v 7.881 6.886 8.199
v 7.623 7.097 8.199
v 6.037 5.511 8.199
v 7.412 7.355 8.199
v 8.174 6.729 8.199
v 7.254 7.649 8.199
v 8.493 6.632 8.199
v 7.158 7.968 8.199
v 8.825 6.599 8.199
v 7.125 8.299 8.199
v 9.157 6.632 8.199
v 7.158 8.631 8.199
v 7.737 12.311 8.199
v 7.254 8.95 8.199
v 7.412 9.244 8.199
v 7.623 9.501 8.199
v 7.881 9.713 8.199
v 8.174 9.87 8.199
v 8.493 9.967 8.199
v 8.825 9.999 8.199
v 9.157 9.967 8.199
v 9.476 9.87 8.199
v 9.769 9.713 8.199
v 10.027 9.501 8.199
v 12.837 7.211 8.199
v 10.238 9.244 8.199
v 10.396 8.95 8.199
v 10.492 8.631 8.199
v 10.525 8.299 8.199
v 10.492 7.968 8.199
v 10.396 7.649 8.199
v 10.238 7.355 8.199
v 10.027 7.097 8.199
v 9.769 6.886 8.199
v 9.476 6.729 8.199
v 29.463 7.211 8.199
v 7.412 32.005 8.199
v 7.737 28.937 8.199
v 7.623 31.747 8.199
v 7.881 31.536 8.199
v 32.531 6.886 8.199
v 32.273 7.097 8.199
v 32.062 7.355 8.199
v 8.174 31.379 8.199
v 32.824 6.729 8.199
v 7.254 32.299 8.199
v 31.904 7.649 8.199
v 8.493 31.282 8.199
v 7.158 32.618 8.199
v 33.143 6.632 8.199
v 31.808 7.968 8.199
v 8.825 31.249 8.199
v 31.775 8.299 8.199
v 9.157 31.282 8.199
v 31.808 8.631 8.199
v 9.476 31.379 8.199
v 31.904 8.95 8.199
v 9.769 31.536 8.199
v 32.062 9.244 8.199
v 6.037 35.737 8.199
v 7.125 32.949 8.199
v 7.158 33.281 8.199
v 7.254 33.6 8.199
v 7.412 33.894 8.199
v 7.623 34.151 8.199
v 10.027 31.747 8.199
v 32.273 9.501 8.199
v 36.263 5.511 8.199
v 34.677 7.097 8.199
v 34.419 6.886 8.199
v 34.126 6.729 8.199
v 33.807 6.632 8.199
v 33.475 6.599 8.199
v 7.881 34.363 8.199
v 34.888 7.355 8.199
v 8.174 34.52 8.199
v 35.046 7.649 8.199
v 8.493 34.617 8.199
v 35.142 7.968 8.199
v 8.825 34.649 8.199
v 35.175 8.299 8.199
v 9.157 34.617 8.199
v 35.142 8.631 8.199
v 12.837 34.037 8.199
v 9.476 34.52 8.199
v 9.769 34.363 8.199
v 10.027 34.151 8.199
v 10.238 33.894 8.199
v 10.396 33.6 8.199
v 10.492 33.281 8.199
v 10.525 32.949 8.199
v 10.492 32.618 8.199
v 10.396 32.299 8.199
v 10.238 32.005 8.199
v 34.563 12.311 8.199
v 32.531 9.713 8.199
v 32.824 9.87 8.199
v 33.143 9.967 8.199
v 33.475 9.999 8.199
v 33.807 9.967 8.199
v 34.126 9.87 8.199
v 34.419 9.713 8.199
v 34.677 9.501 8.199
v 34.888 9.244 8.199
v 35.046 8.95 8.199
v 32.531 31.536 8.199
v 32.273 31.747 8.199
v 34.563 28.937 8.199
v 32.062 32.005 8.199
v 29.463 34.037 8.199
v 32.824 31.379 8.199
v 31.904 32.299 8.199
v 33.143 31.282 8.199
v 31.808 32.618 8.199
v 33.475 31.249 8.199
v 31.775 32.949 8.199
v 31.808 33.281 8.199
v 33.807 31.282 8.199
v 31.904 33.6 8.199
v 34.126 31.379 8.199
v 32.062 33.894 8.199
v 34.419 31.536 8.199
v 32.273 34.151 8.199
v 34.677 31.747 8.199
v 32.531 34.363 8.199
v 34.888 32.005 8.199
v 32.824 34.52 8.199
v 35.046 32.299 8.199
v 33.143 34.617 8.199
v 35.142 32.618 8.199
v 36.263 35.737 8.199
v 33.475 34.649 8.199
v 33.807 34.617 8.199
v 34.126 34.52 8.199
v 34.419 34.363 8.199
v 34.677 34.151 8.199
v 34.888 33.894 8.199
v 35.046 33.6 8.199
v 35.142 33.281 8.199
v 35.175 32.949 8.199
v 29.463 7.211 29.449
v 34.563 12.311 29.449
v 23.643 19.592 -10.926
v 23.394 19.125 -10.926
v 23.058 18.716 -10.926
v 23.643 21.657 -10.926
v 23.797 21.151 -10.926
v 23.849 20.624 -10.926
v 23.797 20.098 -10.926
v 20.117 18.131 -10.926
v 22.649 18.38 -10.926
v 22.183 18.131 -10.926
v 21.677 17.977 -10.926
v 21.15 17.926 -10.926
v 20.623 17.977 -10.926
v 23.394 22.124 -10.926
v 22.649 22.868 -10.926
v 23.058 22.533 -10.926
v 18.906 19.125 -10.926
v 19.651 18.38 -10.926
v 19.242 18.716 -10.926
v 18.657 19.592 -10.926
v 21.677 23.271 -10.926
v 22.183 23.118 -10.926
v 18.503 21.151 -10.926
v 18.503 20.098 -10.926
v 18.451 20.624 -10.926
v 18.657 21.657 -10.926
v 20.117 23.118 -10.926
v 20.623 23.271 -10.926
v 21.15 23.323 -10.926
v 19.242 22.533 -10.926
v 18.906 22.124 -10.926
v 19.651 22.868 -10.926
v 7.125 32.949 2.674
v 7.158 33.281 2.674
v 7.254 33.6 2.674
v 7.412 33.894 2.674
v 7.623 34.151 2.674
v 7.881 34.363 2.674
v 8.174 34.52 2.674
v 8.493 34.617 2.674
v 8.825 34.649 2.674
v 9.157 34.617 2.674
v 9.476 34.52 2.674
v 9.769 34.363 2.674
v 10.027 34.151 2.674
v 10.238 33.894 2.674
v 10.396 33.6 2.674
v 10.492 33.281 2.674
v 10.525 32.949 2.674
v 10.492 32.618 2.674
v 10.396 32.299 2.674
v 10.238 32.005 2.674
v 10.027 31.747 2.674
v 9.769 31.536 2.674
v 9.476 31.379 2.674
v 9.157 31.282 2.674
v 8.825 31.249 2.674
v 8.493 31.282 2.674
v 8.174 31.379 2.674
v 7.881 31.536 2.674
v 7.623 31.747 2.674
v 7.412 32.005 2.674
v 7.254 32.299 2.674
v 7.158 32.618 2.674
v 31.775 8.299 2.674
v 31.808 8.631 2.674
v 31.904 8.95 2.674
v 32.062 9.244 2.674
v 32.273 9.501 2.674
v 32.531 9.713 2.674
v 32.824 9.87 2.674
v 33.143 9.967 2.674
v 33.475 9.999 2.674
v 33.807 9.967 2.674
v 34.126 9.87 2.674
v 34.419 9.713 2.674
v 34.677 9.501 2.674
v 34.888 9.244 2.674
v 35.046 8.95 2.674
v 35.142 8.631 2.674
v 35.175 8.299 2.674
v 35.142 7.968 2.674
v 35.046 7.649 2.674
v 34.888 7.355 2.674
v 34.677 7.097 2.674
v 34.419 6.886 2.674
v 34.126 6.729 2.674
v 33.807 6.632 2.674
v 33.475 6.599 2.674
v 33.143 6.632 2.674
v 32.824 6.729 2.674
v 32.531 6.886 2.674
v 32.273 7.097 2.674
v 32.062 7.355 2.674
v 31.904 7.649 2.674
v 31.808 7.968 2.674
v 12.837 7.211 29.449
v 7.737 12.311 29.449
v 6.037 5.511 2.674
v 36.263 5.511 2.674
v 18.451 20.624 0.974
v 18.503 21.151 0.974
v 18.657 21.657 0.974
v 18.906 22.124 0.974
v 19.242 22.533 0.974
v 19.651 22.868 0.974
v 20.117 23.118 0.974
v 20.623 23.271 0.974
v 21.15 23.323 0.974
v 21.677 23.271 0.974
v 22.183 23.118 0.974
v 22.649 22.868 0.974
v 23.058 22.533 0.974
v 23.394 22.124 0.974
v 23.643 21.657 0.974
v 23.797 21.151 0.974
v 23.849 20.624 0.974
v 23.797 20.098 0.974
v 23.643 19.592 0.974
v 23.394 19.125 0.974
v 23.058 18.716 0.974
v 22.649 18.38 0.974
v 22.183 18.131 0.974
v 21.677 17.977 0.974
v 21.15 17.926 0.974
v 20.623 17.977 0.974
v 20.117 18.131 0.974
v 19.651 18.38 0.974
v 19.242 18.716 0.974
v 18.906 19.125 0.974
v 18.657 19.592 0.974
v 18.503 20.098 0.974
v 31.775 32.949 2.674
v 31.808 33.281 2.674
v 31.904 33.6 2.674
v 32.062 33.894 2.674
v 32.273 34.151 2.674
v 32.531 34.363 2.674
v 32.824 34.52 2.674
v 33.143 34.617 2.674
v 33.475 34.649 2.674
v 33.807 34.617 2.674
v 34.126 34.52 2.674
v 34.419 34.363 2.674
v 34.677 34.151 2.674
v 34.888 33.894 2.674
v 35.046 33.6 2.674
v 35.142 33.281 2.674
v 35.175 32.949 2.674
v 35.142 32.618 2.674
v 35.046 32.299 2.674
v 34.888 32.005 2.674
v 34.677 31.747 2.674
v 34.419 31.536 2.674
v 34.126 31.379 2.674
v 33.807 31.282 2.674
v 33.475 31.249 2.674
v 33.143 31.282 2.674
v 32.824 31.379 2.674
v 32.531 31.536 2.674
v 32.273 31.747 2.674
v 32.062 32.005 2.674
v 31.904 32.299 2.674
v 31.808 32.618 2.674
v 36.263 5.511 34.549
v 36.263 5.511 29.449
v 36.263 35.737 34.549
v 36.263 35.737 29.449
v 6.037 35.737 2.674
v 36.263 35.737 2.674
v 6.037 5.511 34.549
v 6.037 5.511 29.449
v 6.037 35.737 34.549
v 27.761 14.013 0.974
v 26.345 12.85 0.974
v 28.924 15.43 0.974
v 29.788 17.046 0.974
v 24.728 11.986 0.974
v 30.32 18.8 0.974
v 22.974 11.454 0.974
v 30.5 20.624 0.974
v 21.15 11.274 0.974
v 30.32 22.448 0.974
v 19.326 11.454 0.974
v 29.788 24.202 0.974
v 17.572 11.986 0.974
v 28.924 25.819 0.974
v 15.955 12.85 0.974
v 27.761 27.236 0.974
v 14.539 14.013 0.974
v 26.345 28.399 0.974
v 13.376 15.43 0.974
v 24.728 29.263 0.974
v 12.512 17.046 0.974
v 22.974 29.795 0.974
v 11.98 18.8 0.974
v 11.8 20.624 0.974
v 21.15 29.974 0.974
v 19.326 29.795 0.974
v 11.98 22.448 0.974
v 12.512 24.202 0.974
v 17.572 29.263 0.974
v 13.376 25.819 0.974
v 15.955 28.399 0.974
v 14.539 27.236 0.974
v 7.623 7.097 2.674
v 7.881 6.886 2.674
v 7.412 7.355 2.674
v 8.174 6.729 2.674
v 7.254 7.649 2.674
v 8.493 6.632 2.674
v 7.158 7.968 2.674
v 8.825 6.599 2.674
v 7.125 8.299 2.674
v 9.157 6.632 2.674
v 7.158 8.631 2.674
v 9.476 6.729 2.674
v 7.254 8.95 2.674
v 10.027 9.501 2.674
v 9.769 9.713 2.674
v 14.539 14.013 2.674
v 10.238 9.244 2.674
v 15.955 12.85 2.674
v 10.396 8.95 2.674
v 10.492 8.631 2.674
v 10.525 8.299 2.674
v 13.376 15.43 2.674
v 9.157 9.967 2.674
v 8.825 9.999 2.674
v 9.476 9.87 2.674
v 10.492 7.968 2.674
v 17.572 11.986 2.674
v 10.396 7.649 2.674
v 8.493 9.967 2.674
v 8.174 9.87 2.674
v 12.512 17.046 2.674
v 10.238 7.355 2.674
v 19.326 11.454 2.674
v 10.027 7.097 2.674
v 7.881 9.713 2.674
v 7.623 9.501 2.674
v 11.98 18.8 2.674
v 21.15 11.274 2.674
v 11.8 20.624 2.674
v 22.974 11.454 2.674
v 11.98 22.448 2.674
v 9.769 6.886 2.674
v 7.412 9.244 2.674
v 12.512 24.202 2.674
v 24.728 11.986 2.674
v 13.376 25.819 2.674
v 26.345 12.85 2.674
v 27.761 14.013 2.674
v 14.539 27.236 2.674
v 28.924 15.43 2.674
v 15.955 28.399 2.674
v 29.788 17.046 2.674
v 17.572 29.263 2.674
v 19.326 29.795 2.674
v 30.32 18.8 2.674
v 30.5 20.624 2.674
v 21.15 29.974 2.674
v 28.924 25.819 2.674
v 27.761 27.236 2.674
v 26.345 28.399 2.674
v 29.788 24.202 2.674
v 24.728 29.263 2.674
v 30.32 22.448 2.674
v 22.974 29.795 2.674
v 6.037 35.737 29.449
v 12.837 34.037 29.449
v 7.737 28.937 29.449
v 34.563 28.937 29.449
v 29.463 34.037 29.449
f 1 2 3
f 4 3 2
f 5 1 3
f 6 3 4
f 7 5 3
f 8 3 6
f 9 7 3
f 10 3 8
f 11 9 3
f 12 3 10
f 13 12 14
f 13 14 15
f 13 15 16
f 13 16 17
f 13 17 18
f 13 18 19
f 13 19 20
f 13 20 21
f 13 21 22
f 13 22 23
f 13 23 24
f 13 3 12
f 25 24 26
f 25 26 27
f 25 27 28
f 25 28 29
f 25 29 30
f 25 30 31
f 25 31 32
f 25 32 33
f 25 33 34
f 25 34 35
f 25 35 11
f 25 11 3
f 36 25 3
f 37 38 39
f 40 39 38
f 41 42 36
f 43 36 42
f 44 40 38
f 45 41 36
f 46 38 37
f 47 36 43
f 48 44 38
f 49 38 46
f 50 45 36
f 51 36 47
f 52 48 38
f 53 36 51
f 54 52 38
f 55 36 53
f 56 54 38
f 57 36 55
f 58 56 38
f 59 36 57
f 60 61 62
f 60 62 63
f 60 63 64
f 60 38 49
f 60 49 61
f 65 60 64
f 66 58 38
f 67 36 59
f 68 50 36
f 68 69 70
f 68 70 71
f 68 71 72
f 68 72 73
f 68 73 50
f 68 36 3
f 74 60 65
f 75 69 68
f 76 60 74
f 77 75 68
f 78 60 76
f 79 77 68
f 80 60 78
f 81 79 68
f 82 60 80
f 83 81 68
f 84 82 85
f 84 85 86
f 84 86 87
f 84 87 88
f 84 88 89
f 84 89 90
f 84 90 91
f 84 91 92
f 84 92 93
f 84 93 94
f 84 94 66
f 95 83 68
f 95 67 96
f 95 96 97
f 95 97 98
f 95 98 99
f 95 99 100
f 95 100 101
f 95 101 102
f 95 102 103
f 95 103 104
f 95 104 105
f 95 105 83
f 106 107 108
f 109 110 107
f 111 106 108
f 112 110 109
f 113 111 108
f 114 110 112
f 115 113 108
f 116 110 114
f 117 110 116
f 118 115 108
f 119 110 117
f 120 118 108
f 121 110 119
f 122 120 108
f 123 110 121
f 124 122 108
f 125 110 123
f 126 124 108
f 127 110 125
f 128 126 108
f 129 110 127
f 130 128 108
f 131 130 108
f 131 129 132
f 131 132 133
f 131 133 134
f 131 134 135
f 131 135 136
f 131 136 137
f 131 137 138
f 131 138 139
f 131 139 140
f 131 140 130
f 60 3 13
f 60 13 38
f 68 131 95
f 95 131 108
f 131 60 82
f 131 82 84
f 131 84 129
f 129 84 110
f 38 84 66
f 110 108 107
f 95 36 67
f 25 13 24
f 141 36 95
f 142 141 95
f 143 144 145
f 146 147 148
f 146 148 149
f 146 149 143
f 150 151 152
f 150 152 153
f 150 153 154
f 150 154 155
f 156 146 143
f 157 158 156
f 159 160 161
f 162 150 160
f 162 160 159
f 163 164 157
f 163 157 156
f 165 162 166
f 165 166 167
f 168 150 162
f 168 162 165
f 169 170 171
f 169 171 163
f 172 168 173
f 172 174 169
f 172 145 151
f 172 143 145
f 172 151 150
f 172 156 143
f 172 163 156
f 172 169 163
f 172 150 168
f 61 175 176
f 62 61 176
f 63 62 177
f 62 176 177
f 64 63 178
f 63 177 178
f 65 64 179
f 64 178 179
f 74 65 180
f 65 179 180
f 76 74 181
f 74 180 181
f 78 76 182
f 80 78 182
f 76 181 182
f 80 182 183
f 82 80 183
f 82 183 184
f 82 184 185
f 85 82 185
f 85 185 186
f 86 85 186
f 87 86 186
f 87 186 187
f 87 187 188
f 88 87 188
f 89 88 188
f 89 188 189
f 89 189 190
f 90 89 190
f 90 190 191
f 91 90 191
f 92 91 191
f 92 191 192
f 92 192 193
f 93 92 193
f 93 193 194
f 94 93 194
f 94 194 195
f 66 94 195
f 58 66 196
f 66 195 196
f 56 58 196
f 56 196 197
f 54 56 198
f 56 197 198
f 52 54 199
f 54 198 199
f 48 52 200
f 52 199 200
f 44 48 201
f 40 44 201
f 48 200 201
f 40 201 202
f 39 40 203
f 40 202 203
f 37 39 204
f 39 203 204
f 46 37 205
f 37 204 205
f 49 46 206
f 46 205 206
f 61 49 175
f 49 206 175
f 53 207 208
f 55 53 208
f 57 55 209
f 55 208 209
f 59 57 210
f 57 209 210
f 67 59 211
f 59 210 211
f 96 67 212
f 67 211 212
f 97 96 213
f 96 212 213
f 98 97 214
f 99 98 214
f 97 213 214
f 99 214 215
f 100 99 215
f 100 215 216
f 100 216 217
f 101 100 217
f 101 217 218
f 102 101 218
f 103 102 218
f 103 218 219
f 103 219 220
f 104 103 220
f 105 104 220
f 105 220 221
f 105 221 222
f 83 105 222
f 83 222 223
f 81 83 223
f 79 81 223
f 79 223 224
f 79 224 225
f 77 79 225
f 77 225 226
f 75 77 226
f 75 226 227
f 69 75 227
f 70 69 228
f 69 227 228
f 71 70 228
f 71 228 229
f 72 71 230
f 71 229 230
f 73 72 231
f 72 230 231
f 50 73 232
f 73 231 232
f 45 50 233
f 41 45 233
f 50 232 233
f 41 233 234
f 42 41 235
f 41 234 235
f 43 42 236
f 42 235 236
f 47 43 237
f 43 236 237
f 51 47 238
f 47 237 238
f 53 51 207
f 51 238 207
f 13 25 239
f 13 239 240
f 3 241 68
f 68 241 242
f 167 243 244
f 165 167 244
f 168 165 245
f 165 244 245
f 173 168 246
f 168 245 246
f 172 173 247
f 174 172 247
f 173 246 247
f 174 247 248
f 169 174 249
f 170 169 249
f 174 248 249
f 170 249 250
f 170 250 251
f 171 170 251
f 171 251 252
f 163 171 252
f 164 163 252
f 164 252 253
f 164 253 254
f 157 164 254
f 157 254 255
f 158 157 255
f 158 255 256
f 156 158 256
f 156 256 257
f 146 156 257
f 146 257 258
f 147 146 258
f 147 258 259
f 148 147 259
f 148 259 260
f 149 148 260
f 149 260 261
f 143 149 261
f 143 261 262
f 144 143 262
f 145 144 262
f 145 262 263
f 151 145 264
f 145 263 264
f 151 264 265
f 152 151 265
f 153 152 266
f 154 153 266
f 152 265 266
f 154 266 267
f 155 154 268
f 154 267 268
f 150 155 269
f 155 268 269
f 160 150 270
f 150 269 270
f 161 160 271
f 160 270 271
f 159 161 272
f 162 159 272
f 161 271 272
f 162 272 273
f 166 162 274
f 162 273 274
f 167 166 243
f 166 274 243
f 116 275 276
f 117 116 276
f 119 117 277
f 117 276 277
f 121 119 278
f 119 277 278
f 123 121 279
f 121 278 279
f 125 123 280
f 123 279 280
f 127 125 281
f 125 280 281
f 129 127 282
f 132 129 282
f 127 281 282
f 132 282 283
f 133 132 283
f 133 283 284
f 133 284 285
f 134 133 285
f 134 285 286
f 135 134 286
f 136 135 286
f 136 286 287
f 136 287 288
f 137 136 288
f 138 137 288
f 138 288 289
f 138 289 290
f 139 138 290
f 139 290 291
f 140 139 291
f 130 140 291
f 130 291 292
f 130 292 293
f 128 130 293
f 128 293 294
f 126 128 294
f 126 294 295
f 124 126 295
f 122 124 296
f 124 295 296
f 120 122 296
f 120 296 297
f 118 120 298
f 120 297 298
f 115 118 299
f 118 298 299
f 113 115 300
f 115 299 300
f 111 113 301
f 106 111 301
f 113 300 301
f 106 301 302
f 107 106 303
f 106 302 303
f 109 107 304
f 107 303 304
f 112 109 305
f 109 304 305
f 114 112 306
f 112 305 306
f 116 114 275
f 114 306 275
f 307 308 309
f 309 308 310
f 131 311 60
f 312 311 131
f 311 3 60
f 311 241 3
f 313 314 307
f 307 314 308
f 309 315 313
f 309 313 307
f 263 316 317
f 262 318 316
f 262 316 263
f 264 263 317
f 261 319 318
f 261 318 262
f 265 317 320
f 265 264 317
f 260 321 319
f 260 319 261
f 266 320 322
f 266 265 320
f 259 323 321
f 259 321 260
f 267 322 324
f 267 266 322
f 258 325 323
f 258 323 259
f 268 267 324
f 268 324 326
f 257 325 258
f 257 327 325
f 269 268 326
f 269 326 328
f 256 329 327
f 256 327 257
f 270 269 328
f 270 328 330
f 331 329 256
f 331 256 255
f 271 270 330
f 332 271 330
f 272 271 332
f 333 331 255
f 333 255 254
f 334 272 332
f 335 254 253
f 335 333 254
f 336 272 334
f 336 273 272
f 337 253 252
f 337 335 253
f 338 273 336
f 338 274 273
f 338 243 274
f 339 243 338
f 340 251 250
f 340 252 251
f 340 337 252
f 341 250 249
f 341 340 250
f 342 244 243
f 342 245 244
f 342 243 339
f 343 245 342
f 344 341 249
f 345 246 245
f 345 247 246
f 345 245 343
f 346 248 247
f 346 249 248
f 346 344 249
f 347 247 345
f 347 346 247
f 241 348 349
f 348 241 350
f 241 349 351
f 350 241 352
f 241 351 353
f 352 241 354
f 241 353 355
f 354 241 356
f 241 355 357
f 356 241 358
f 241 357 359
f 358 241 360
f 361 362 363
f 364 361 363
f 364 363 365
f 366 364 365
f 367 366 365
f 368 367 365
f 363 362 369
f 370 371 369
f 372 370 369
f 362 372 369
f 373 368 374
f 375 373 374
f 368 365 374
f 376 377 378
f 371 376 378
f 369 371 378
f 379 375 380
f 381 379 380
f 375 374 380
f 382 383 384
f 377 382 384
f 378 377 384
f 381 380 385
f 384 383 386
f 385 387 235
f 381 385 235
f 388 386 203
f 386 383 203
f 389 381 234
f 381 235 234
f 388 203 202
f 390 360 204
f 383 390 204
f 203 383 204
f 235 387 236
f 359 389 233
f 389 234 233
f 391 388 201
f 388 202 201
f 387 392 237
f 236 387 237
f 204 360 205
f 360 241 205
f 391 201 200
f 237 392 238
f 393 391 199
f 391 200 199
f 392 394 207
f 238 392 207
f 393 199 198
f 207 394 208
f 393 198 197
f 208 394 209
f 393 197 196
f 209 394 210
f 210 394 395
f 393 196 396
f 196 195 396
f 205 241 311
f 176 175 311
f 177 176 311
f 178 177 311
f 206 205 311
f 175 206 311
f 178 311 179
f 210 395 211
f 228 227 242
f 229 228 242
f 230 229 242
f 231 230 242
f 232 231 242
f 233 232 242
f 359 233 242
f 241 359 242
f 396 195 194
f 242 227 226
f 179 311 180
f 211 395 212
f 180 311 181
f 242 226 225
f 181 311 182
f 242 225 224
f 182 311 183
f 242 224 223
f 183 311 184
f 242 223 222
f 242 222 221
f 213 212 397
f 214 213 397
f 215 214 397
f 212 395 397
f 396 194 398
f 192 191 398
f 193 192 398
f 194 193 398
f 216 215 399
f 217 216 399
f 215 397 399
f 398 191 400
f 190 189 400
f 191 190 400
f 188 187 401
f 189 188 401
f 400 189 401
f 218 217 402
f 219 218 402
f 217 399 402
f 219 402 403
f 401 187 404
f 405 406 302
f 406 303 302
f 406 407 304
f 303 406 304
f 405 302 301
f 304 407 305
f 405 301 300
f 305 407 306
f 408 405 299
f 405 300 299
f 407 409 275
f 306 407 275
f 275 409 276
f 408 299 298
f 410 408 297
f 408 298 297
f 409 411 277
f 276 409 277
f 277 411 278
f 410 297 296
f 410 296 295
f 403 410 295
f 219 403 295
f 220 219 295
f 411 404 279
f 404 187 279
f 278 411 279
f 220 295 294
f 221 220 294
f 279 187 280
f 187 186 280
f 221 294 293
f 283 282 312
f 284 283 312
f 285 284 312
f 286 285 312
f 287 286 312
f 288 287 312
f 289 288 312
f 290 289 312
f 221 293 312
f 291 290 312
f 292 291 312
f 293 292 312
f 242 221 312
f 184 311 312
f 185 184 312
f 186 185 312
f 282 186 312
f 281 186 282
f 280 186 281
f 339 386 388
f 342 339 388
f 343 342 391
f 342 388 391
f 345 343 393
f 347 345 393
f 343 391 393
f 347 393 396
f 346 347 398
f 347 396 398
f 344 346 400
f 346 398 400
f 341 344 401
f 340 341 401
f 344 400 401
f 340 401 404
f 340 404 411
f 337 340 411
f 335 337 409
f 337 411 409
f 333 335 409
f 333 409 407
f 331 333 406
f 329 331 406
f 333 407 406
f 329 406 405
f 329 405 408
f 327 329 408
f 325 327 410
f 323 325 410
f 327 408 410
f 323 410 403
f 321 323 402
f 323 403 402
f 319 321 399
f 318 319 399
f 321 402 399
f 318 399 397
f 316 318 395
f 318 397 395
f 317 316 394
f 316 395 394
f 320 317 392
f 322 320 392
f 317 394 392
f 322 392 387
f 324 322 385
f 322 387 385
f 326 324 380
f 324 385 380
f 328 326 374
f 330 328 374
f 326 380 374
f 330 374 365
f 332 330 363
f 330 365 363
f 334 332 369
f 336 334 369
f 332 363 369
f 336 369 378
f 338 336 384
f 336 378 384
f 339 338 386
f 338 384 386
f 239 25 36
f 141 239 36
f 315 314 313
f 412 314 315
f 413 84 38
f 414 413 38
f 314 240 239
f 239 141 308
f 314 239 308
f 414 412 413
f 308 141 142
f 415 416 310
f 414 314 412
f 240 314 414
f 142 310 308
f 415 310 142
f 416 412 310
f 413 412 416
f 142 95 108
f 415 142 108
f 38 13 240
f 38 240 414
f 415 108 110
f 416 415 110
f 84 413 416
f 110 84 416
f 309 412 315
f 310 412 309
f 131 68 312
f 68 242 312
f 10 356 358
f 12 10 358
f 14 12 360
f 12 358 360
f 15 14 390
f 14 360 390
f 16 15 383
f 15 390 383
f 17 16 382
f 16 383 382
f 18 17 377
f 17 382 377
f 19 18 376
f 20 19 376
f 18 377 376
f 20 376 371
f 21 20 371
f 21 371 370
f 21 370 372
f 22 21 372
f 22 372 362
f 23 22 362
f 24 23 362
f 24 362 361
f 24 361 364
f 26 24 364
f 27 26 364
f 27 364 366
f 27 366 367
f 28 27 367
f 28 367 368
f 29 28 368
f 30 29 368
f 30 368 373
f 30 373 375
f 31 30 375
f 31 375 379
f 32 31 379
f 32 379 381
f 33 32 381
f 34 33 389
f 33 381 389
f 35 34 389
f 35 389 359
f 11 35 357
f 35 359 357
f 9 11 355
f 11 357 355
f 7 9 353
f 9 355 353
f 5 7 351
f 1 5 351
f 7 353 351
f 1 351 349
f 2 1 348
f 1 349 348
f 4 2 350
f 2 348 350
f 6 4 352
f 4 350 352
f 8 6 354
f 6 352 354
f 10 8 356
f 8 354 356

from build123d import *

# Parameters (mm, degrees)
SKETCH1_W           = 35.56
SKETCH1_H           = 35.56
BOSS_EXTRUDE1_DEPTH = 4.5
SKETCH2_W           = 35.56
SKETCH2_H           = 35.56
BOSS_EXTRUDE2_DEPTH = 2
SKETCH5_R           = 11
BOSS_EXTRUDE5_DEPTH = 2
SKETCH6_R           = 3.175
BOSS_EXTRUDE6_DEPTH = 24
SKETCH7_R           = 2
CUT_EXTRUDE3_DEPTH  = 29
SKETCH8_W           = 31.56
SKETCH8_H           = 31.56
BOSS_EXTRUDE7_DEPTH = 25
SKETCH9_W           = 35.56
SKETCH9_H           = 35.56
BOSS_EXTRUDE8_DEPTH = 6
CHAMFER1_SIZE       = 6
SCALE1_SCALE        = 0.85
CUT_EXTRUDE4_START  = -8.5
SKETCH10_R          = 2.69875
CUT_EXTRUDE4_DEPTH  = 8.5


with BuildPart() as part:
    # Sketch1 → Boss-Extrude1 (new body)
    with BuildSketch(Plane.XY):
        with Locations((21.15, 20.624391857)):
            Rectangle(SKETCH1_W, SKETCH1_H)
    extrude(amount=BOSS_EXTRUDE1_DEPTH)

    # Sketch2 → Boss-Extrude2 (add)
    with BuildSketch(Plane.XY.offset(4.5)):
        with Locations((21.15, 20.624391857)):
            Rectangle(SKETCH2_W, SKETCH2_H)
    extrude(amount=BOSS_EXTRUDE2_DEPTH)

    # Sketch5 → Boss-Extrude5 (add)
    with BuildSketch(Plane(origin=(0, 0, 0), x_dir=(-1, 0, 0), z_dir=(0, 0, -1))):
        with Locations((-21.15, 20.624391857)):
            Circle(SKETCH5_R)
    extrude(amount=BOSS_EXTRUDE5_DEPTH)

    # Sketch6 → Boss-Extrude6 (add)
    with BuildSketch(Plane(origin=(0, 0, -2), x_dir=(-1, 0, 0), z_dir=(0, 0, -1))):
        with Locations((-21.15, 20.624391857)):
            Circle(SKETCH6_R)
    extrude(amount=BOSS_EXTRUDE6_DEPTH)

    # Sketch7 → Cut-Extrude3 (cut)
    with BuildSketch(Plane(origin=(0, 0, 0), x_dir=(-1, 0, 0), z_dir=(0, 0, -1))):
        with Locations((-35.65, 6.124391857)):
            Circle(SKETCH7_R)
        with Locations((-6.65, 6.124391857)):
            Circle(SKETCH7_R)
        with Locations((-6.65, 35.124391857)):
            Circle(SKETCH7_R)
        with Locations((-35.65, 35.124391857)):
            Circle(SKETCH7_R)
    extrude(amount=-CUT_EXTRUDE3_DEPTH, mode=Mode.SUBTRACT)

    # Sketch8 → Boss-Extrude7 (add)
    with BuildSketch(Plane.XY.offset(6.5)):
        with Locations((21.15, 20.624391857)):
            Rectangle(SKETCH8_W, SKETCH8_H)
    extrude(amount=BOSS_EXTRUDE7_DEPTH)

    # Sketch9 → Boss-Extrude8 (add)
    with BuildSketch(Plane.XY.offset(31.5)):
        with Locations((21.15, 20.624391857)):
            Rectangle(SKETCH9_W, SKETCH9_H)
    extrude(amount=BOSS_EXTRUDE8_DEPTH)

    # Chamfer1
    # the kernel refuses this chamfer: 6 mm, written as the material it takes off along each edge
    with BuildSketch(Plane(origin=(5.37, 36.404391857, 6.5), x_dir=(0.9996219169112968, 0.02749587661058678, 0), z_dir=(0, 0, 1)), Plane(origin=(36.93, 4.844391857, 6.5), x_dir=(-0.9996219169112969, -0.027495876610586355, 0), z_dir=(0, 0, 1)), Plane(origin=(36.93, 36.404391857, 6.5), x_dir=(0.02749587661058678, -0.9996219169112968, 0), z_dir=(0, 0, 1))) as chamfer1_piece_1:
        Polygon((CHAMFER1_SIZE * 0.999621916911, -CHAMFER1_SIZE * 0.0274958766106), (-CHAMFER1_SIZE * 0.0274958766106, -CHAMFER1_SIZE * 0.999621916911), (0, 0), align=None)
    extrude(amount=25, mode=Mode.SUBTRACT)
    with BuildSketch(Plane(origin=(5.37, 4.844391857, 6.5), x_dir=(0.9996219169112969, -0.027495876610586348, 0), z_dir=(0, 0, 1))) as chamfer1_piece_2:
        Polygon((CHAMFER1_SIZE * 0.999621916911, CHAMFER1_SIZE * 0.0274958766106), (-CHAMFER1_SIZE * 0.0274958766106, CHAMFER1_SIZE * 0.999621916911), (0, 0), align=None)
    extrude(amount=25, mode=Mode.SUBTRACT)


with BuildPart() as part_1:
    # Scale1: scaled about (21.15, 20.624391857, 17.82804973)
    add(part.part.scale(SCALE1_SCALE).moved(Location((3.1725, 3.093658779, 2.67420746))))

    # Sketch10 → Cut-Extrude4 (cut)
    with BuildSketch(Plane(origin=(0, 0, -19.425792541), x_dir=(-1, 0, 0), z_dir=(0, 0, -1)).offset(CUT_EXTRUDE4_START)):
        with Locations((-21.15, 20.624391857)):
            Circle(SKETCH10_R)
    extrude(amount=CUT_EXTRUDE4_DEPTH, mode=Mode.SUBTRACT)


solid = part_1.part
